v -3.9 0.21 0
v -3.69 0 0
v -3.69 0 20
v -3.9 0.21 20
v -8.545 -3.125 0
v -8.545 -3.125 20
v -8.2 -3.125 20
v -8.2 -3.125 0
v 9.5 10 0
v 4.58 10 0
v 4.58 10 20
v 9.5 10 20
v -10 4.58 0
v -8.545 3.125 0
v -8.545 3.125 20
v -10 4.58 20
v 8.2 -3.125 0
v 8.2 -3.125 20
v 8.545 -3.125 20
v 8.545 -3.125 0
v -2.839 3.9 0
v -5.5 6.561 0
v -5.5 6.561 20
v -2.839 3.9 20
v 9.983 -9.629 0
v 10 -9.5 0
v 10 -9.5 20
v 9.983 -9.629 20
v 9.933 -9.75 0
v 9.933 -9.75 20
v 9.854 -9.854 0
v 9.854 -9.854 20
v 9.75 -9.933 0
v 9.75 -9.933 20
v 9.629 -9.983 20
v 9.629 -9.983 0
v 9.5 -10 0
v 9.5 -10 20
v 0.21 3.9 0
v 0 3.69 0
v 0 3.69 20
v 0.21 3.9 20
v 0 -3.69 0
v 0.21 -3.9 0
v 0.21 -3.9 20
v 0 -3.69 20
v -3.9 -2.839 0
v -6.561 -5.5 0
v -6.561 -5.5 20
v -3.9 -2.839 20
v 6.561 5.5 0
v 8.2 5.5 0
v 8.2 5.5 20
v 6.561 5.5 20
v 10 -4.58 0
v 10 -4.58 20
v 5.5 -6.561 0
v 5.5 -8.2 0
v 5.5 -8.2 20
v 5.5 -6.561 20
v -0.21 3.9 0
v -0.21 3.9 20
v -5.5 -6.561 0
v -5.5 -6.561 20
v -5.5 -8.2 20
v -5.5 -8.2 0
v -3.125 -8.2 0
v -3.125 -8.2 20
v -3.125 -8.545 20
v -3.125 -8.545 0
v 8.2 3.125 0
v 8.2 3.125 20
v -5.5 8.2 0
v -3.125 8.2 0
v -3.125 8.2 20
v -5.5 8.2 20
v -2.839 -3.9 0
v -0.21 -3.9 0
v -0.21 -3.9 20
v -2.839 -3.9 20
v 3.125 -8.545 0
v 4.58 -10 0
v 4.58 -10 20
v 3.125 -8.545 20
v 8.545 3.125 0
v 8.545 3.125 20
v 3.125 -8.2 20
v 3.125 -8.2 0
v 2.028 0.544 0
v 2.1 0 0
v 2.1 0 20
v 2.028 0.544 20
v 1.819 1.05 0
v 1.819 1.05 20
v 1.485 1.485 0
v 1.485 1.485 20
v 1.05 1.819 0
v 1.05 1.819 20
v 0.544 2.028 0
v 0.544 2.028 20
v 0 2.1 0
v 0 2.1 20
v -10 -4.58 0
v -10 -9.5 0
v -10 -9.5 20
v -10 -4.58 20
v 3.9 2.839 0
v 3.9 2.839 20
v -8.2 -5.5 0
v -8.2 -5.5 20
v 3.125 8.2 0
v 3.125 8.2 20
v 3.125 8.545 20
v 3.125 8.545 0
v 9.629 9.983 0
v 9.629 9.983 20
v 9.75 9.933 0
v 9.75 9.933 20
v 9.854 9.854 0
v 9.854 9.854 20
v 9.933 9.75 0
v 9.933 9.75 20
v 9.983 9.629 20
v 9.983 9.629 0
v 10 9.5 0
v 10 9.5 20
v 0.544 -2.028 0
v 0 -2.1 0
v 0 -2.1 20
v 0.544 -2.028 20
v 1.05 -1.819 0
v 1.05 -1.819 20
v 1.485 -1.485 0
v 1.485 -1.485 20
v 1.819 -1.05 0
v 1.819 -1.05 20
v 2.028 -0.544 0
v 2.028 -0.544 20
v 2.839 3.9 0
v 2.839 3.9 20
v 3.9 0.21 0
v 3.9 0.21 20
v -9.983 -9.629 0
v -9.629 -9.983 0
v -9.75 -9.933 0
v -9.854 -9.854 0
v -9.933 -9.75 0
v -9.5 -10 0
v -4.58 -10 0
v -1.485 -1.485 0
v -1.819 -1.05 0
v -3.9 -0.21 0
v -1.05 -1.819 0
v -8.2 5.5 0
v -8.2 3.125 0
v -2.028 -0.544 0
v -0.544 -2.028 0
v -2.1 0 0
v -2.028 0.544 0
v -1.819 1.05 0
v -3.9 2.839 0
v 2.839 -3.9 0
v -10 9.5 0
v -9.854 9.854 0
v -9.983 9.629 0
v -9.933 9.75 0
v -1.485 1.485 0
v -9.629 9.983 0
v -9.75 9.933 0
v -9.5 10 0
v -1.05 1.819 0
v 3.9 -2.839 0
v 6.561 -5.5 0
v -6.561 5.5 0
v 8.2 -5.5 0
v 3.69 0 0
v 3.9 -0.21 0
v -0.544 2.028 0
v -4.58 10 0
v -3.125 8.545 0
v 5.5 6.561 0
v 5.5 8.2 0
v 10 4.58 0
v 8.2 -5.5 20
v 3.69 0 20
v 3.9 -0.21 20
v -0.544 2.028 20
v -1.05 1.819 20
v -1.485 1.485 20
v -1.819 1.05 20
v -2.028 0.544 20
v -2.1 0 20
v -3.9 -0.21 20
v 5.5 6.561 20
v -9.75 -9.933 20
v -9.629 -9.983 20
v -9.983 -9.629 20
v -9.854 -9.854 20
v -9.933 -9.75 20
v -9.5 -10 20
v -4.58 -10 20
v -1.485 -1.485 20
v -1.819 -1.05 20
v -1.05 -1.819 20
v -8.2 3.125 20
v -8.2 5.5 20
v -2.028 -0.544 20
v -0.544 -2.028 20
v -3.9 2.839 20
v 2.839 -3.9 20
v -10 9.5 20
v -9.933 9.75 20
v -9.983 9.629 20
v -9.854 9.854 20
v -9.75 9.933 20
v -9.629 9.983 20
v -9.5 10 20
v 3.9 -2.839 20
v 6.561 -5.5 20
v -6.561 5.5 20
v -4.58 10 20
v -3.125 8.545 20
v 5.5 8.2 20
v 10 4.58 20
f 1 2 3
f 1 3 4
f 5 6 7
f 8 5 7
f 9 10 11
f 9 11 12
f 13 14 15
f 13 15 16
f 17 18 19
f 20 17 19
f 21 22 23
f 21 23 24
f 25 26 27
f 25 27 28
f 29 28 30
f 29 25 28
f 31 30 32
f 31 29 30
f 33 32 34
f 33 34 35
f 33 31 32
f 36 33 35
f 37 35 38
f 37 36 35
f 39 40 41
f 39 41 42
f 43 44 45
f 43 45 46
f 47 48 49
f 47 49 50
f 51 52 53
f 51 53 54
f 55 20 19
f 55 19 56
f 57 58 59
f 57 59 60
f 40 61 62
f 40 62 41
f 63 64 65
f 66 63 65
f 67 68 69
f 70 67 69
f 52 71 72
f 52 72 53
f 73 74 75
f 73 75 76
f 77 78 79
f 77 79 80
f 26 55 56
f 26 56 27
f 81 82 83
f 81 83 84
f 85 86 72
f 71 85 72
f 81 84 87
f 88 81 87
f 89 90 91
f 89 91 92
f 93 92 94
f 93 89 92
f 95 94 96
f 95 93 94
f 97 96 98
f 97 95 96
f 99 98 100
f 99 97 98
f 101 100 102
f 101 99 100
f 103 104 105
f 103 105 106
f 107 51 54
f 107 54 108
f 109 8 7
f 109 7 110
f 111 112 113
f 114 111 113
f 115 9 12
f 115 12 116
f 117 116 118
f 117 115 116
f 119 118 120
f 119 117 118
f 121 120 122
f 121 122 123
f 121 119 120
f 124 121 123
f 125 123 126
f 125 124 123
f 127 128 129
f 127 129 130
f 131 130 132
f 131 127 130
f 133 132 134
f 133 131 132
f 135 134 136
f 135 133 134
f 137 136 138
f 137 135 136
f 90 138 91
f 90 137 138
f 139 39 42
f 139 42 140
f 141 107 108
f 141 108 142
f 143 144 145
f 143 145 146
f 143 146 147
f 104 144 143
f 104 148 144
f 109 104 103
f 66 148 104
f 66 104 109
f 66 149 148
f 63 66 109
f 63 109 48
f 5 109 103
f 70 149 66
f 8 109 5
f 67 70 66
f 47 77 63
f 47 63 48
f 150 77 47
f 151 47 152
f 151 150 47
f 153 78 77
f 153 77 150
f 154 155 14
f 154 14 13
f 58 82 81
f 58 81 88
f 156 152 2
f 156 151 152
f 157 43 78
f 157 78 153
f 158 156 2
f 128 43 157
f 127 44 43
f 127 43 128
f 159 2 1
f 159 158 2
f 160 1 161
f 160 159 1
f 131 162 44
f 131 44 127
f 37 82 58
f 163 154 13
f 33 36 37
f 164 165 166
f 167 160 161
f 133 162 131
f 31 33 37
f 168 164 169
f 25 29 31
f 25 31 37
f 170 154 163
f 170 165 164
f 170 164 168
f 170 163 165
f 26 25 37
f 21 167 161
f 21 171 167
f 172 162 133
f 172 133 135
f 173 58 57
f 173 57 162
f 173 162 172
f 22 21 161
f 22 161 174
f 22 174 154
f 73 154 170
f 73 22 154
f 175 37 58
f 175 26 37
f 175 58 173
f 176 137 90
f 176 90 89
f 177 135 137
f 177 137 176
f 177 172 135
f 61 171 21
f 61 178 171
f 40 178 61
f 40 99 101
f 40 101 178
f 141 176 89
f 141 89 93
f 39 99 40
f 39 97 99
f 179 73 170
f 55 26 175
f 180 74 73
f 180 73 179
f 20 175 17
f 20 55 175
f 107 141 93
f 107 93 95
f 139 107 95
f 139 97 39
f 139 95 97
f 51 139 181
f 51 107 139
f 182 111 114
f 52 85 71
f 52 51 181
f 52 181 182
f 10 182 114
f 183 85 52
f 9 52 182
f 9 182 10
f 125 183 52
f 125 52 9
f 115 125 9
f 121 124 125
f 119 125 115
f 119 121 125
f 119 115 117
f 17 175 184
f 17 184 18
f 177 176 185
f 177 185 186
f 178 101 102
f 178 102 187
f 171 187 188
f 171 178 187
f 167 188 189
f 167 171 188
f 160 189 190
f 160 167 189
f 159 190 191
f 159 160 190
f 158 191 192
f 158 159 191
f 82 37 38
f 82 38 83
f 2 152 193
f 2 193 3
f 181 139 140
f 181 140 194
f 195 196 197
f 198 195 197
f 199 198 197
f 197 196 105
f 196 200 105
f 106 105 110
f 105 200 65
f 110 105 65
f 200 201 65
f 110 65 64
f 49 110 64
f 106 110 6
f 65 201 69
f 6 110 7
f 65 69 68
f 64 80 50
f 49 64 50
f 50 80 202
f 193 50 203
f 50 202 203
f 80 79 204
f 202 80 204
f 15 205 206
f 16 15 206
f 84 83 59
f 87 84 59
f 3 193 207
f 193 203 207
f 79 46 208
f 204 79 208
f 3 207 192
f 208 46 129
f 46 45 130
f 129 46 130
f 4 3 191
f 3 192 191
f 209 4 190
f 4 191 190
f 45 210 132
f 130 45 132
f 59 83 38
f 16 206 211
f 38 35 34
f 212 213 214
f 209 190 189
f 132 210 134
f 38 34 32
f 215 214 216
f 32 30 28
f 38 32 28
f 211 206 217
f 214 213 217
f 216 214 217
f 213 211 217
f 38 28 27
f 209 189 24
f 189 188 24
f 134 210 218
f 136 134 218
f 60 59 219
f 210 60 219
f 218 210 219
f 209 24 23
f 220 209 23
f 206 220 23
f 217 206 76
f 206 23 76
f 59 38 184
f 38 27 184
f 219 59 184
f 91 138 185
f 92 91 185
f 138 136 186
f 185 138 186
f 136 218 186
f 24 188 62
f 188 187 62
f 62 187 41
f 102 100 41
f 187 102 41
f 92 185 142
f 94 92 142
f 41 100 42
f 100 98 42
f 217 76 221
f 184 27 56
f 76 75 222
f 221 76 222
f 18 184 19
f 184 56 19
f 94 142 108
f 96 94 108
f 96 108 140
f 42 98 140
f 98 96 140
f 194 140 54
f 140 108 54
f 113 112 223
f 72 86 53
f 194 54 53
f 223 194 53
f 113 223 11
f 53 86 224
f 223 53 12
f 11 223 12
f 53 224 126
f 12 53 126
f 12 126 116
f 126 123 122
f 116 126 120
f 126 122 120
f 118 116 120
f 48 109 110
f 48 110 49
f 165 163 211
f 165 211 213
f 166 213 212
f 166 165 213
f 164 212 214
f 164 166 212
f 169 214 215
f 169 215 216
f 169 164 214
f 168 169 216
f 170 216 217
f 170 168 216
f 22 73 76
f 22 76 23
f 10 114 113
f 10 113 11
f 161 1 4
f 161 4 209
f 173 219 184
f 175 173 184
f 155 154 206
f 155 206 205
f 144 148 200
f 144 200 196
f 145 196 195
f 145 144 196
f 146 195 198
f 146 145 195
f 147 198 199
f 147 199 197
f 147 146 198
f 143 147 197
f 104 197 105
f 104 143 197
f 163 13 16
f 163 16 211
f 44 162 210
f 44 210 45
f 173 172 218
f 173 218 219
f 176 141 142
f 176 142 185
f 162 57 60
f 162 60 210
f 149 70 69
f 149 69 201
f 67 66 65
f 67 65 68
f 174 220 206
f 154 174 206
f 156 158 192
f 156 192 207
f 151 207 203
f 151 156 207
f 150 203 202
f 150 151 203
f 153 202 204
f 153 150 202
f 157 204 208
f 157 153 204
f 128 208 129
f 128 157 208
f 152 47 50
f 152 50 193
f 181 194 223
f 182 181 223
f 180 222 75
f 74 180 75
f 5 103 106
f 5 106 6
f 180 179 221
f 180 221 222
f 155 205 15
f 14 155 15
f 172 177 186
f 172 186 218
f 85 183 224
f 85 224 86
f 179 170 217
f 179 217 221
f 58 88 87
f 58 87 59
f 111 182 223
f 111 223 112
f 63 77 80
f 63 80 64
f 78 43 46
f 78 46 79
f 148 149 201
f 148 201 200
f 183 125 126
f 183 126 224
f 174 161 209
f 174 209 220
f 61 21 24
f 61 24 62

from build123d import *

# Parameters (mm, degrees)
BOSS_EXTRU_1_DEPTH           = 20
R_P_TITION_CIRCULAIRE1_COUNT = 4


with BuildPart() as part:
    # Esquisse1 → Boss.-Extru.1 (new body)
    with BuildSketch(Plane.XY):
        with BuildLine():
            Line((-9.5, 10), (-4.58, 10))
            Line((-4.58, 10), (-3.125, 8.545))
            Line((-3.125, 8.545), (-3.125, 8.2))
            Line((-3.125, 8.2), (-5.5, 8.2))
            Line((-5.5, 8.2), (-5.5, 6.560660172))
            Line((-5.5, 6.560660172), (-2.839339828, 3.9))
            Line((-2.839339828, 3.9), (-0.21, 3.9))
            Line((-0.21, 3.9), (0, 3.69))
            Line((0, 3.69), (0, 2.1))
            ThreePointArc((0, 2.1), (-1.48492424, 1.48492424), (-2.1, 0))
            Line((-2.1, 0), (-3.69, 0))
            Line((-3.69, 0), (-3.9, 0.21))
            Line((-3.9, 0.21), (-3.9, 2.839339828))
            Line((-3.9, 2.839339828), (-6.560660172, 5.5))
            Line((-6.560660172, 5.5), (-8.2, 5.5))
            Line((-8.2, 5.5), (-8.2, 3.125))
            Line((-8.2, 3.125), (-8.545, 3.125))
            Line((-8.545, 3.125), (-10, 4.58))
            Line((-10, 4.58), (-10, 9.5))
            ThreePointArc((-10, 9.5), (-9.853553391, 9.853553391), (-9.5, 10))
        make_face()
    boss_extru_1 = extrude(amount=BOSS_EXTRU_1_DEPTH)

    # Répétition circulaire1: Boss.-Extru.1 ×4 about axis
    r_p_tition_circulaire1_axis = Axis((0, 0, -13.782028156), (0, 0, 1))
    for i in range(1, R_P_TITION_CIRCULAIRE1_COUNT):
        add(boss_extru_1.rotate(r_p_tition_circulaire1_axis, i * 360 / R_P_TITION_CIRCULAIRE1_COUNT))


solid = part.part
